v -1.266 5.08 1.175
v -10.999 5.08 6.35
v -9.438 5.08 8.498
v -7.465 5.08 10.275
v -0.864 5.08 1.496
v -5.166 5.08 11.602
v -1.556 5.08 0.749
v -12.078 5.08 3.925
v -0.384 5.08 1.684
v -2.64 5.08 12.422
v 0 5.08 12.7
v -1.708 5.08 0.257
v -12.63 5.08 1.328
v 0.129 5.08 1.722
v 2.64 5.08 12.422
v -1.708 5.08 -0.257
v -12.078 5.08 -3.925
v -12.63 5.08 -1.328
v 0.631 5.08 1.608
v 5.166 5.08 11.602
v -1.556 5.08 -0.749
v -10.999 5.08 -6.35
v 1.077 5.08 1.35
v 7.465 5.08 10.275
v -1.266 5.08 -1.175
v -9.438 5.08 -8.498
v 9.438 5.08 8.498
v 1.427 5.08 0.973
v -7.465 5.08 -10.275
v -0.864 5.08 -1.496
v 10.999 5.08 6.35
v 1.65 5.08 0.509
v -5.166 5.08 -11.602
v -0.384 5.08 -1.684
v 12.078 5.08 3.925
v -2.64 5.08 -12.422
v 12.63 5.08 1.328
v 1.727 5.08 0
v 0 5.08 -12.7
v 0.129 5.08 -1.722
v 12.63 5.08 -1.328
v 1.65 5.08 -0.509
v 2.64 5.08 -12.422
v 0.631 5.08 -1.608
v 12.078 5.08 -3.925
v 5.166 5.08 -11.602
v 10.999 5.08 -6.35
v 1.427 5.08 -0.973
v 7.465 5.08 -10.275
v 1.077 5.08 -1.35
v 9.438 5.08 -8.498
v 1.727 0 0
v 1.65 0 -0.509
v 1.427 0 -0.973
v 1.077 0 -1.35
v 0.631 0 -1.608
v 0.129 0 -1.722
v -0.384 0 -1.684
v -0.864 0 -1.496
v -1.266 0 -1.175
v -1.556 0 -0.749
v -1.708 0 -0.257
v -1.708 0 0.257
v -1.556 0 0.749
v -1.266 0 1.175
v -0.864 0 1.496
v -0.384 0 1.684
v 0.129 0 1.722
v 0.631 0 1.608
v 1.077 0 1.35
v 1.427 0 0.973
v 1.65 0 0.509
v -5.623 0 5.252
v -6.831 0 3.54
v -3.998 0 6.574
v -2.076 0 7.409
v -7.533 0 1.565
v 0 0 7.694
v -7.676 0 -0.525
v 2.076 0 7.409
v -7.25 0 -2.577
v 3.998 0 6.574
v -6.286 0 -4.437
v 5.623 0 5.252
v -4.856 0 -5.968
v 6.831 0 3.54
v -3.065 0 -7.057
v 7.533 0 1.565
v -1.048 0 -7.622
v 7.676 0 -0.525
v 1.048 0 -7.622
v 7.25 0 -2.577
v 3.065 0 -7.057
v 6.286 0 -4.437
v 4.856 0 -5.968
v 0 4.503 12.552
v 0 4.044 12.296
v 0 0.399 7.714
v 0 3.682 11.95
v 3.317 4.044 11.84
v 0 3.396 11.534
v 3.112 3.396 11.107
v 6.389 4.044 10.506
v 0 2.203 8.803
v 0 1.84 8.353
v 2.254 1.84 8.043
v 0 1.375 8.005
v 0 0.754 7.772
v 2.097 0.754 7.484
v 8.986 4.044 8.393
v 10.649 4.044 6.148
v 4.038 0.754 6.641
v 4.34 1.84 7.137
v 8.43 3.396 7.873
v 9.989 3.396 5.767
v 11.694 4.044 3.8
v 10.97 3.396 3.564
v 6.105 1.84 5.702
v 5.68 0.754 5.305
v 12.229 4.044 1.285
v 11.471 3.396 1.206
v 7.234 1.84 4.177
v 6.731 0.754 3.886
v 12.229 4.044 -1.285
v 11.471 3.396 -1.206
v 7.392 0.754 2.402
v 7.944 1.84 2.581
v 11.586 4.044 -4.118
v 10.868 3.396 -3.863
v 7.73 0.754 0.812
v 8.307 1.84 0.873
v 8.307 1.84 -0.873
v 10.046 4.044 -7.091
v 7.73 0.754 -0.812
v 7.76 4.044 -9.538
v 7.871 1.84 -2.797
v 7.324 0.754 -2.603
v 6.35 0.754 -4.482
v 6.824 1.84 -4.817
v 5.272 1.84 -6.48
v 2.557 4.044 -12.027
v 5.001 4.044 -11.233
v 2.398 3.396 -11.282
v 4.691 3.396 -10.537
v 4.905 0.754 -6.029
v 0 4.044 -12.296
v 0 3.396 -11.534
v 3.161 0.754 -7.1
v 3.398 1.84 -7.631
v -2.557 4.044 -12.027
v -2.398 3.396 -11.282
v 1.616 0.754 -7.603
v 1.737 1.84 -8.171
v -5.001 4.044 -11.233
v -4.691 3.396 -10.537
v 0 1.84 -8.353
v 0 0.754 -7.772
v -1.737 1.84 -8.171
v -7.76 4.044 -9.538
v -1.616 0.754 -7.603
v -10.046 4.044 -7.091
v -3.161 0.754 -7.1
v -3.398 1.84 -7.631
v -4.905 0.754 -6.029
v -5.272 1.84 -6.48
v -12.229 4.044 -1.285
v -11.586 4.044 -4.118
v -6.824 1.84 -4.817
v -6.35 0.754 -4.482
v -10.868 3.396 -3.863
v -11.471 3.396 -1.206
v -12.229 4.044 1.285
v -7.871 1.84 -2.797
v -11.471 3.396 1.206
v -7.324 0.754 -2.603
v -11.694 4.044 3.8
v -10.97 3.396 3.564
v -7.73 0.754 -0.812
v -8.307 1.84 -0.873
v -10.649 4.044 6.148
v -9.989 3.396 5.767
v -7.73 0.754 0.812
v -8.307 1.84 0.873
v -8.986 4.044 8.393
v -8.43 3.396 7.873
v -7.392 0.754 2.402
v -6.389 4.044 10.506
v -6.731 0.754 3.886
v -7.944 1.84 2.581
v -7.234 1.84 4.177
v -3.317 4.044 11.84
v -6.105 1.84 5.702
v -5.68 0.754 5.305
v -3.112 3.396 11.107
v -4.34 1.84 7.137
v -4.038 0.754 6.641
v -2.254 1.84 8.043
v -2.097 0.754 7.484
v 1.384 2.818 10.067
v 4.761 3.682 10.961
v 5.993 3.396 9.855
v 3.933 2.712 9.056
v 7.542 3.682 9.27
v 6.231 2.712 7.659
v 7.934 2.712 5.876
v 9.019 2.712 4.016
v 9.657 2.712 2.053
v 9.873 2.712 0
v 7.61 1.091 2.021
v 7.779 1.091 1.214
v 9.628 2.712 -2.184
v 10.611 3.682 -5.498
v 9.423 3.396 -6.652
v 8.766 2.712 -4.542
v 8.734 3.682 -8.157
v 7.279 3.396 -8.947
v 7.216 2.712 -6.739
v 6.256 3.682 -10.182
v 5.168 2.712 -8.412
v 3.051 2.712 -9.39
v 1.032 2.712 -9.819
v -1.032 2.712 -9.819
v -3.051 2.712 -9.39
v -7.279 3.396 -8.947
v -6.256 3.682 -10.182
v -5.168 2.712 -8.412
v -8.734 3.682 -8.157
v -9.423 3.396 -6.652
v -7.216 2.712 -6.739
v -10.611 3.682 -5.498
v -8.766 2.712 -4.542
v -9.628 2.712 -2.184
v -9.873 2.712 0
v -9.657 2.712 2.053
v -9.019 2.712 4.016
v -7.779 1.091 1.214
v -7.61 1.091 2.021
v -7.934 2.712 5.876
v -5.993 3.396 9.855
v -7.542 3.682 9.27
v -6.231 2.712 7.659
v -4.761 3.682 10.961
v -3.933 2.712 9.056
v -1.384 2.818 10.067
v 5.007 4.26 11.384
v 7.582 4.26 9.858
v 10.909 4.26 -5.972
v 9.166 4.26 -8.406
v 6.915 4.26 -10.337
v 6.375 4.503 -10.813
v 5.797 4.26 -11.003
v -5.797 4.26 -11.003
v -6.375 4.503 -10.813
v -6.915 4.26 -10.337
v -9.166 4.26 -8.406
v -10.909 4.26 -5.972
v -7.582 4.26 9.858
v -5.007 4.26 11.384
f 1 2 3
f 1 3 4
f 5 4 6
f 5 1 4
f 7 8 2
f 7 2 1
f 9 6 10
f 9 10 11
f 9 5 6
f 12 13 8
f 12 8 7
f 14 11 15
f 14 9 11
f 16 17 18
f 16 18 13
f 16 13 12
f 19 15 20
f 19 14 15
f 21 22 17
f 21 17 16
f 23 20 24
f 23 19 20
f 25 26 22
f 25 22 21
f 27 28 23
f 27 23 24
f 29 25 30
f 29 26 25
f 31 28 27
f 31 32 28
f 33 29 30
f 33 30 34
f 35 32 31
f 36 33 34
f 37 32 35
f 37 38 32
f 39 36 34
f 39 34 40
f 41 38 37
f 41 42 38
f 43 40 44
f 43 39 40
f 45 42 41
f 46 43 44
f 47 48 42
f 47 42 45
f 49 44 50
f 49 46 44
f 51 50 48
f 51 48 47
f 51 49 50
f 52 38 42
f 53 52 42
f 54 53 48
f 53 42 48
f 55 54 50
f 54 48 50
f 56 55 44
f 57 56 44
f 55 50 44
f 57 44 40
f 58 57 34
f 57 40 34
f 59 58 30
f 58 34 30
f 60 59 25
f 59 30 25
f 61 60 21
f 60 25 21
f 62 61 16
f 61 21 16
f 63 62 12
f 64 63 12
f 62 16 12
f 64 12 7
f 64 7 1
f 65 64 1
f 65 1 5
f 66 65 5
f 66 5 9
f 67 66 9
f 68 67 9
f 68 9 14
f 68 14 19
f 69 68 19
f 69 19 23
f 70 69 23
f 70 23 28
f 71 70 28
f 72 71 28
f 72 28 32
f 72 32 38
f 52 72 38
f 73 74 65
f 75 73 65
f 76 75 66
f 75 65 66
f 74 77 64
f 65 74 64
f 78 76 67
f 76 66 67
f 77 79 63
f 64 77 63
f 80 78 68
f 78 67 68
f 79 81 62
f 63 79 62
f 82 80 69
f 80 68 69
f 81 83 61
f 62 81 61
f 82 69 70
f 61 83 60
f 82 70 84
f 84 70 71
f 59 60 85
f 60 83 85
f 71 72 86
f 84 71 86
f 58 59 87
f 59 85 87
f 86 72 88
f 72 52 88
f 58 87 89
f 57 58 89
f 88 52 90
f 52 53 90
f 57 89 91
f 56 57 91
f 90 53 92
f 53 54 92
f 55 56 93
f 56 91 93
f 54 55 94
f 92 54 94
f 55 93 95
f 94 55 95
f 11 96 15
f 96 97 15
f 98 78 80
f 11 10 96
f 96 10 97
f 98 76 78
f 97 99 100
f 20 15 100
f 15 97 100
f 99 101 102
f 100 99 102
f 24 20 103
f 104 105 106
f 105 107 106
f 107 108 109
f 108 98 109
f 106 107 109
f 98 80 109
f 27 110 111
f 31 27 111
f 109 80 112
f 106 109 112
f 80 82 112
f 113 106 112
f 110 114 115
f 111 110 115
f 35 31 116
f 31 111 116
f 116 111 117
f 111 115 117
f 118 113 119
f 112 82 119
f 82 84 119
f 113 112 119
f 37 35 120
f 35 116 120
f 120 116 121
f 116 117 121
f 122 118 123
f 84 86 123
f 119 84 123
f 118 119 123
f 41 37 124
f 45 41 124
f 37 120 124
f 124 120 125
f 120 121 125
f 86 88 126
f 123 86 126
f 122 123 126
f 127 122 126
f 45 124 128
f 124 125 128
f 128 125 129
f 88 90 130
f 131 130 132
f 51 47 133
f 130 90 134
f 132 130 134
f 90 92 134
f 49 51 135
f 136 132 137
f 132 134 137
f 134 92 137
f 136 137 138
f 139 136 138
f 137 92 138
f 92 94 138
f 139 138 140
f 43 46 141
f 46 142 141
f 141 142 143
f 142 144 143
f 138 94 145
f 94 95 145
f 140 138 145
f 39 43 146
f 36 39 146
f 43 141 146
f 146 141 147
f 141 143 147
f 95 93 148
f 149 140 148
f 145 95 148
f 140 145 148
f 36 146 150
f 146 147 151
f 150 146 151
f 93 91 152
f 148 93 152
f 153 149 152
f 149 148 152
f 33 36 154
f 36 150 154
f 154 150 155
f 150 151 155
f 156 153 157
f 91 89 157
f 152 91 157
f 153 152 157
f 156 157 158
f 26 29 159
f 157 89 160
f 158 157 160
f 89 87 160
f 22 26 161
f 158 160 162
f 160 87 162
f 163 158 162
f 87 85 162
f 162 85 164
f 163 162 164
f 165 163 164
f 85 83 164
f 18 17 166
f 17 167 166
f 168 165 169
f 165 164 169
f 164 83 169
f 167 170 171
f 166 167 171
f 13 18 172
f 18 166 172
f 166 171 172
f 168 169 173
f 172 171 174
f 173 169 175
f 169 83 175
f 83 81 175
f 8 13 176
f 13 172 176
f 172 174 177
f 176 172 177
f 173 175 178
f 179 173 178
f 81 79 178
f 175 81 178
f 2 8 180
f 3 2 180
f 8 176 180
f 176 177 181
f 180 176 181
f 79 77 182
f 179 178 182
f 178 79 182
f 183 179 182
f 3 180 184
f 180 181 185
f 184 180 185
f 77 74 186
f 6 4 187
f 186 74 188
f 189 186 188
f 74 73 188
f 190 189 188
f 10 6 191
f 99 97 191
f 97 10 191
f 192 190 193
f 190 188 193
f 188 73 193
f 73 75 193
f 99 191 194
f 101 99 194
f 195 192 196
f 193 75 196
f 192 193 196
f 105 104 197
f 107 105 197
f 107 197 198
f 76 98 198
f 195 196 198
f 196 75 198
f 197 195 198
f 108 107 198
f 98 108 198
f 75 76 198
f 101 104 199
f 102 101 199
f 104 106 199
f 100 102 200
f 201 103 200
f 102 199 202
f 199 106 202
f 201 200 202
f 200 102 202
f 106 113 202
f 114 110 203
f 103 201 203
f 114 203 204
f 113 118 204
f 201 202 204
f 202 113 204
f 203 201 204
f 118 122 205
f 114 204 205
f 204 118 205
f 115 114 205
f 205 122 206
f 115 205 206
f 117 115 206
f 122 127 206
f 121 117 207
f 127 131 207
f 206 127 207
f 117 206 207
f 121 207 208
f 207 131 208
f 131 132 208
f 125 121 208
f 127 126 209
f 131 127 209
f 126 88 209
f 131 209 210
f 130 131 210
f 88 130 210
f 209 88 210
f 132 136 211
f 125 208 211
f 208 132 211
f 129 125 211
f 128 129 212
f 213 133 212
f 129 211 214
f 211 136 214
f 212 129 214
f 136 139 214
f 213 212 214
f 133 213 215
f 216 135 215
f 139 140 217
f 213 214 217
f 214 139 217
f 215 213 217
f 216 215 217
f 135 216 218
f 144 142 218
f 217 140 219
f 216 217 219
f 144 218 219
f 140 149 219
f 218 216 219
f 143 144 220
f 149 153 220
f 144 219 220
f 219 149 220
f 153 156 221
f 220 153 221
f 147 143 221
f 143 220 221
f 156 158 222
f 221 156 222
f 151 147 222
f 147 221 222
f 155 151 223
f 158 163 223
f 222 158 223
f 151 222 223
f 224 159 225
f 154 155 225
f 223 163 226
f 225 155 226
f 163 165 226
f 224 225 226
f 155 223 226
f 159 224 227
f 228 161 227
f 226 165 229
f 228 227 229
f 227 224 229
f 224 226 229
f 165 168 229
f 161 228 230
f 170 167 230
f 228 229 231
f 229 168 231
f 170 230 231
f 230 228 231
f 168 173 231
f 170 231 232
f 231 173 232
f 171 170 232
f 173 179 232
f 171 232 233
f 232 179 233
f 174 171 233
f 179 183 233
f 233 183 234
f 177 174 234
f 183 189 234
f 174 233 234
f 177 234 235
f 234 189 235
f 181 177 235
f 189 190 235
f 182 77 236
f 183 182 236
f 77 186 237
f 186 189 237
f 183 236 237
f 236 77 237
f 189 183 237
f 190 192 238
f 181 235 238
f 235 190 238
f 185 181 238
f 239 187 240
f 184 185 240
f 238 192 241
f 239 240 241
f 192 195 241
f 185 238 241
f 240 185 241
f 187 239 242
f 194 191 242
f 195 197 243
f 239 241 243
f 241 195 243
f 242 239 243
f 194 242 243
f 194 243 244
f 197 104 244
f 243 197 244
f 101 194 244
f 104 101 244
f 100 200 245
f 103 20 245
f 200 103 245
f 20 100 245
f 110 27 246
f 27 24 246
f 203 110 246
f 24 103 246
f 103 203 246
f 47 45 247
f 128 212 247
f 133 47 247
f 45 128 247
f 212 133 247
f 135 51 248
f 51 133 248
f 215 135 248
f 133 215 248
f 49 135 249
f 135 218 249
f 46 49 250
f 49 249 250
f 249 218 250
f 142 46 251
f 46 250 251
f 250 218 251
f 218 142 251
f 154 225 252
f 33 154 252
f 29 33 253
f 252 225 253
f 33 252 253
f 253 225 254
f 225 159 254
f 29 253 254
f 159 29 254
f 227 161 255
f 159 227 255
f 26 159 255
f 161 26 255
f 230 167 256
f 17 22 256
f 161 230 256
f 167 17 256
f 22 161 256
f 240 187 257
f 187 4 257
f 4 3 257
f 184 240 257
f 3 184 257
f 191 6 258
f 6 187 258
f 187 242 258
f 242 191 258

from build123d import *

# Parameters (mm, degrees)
SKETCH1_R             = 12.7
BOSS_EXTRUDE1_DEPTH   = 5.08
F_8_32_TAPPED_HOLE1_D = 3.4544


with BuildPart() as part:
    # Sketch1 → Boss-Extrude1 (new body)
    with BuildSketch(Plane(origin=(0, 0, 0), x_dir=(1, 0, 0), z_dir=(0, 1, 0))):
        Circle(SKETCH1_R)
    extrude(amount=BOSS_EXTRUDE1_DEPTH)

    # Sketch2 → Cut-Revolve1 (revolve, cut)
    with BuildSketch(Plane(origin=(0, 0, 0), x_dir=(0, 0, -1), z_dir=(1, 0, 0))):
        with BuildLine():
            add(Edge.make_bspline(
                [(-12.7, 5.08), (-12.29250781, 2.070805796), (-7.694111536, 3.636711405), (-7.694111536, 0)],
                knots=[0, 0, 0, 0, 1, 1, 1, 1], degree=3))
            Line((-12.7, 5.08), (-12.7, 0))
            Line((-12.7, 0), (-7.694111536, 0))
        make_face()
    revolve(axis=Axis((0, 0, 0), (0, 1, 0)), mode=Mode.SUBTRACT)

    # #8-32 Tapped Hole1 (through all)
    with Locations(Plane(origin=(0, 0, 0), x_dir=(-1, 0, 0), z_dir=(0, -1, 0))):
        with Locations((0, 0)):
            Hole(F_8_32_TAPPED_HOLE1_D / 2)


solid = part.part
